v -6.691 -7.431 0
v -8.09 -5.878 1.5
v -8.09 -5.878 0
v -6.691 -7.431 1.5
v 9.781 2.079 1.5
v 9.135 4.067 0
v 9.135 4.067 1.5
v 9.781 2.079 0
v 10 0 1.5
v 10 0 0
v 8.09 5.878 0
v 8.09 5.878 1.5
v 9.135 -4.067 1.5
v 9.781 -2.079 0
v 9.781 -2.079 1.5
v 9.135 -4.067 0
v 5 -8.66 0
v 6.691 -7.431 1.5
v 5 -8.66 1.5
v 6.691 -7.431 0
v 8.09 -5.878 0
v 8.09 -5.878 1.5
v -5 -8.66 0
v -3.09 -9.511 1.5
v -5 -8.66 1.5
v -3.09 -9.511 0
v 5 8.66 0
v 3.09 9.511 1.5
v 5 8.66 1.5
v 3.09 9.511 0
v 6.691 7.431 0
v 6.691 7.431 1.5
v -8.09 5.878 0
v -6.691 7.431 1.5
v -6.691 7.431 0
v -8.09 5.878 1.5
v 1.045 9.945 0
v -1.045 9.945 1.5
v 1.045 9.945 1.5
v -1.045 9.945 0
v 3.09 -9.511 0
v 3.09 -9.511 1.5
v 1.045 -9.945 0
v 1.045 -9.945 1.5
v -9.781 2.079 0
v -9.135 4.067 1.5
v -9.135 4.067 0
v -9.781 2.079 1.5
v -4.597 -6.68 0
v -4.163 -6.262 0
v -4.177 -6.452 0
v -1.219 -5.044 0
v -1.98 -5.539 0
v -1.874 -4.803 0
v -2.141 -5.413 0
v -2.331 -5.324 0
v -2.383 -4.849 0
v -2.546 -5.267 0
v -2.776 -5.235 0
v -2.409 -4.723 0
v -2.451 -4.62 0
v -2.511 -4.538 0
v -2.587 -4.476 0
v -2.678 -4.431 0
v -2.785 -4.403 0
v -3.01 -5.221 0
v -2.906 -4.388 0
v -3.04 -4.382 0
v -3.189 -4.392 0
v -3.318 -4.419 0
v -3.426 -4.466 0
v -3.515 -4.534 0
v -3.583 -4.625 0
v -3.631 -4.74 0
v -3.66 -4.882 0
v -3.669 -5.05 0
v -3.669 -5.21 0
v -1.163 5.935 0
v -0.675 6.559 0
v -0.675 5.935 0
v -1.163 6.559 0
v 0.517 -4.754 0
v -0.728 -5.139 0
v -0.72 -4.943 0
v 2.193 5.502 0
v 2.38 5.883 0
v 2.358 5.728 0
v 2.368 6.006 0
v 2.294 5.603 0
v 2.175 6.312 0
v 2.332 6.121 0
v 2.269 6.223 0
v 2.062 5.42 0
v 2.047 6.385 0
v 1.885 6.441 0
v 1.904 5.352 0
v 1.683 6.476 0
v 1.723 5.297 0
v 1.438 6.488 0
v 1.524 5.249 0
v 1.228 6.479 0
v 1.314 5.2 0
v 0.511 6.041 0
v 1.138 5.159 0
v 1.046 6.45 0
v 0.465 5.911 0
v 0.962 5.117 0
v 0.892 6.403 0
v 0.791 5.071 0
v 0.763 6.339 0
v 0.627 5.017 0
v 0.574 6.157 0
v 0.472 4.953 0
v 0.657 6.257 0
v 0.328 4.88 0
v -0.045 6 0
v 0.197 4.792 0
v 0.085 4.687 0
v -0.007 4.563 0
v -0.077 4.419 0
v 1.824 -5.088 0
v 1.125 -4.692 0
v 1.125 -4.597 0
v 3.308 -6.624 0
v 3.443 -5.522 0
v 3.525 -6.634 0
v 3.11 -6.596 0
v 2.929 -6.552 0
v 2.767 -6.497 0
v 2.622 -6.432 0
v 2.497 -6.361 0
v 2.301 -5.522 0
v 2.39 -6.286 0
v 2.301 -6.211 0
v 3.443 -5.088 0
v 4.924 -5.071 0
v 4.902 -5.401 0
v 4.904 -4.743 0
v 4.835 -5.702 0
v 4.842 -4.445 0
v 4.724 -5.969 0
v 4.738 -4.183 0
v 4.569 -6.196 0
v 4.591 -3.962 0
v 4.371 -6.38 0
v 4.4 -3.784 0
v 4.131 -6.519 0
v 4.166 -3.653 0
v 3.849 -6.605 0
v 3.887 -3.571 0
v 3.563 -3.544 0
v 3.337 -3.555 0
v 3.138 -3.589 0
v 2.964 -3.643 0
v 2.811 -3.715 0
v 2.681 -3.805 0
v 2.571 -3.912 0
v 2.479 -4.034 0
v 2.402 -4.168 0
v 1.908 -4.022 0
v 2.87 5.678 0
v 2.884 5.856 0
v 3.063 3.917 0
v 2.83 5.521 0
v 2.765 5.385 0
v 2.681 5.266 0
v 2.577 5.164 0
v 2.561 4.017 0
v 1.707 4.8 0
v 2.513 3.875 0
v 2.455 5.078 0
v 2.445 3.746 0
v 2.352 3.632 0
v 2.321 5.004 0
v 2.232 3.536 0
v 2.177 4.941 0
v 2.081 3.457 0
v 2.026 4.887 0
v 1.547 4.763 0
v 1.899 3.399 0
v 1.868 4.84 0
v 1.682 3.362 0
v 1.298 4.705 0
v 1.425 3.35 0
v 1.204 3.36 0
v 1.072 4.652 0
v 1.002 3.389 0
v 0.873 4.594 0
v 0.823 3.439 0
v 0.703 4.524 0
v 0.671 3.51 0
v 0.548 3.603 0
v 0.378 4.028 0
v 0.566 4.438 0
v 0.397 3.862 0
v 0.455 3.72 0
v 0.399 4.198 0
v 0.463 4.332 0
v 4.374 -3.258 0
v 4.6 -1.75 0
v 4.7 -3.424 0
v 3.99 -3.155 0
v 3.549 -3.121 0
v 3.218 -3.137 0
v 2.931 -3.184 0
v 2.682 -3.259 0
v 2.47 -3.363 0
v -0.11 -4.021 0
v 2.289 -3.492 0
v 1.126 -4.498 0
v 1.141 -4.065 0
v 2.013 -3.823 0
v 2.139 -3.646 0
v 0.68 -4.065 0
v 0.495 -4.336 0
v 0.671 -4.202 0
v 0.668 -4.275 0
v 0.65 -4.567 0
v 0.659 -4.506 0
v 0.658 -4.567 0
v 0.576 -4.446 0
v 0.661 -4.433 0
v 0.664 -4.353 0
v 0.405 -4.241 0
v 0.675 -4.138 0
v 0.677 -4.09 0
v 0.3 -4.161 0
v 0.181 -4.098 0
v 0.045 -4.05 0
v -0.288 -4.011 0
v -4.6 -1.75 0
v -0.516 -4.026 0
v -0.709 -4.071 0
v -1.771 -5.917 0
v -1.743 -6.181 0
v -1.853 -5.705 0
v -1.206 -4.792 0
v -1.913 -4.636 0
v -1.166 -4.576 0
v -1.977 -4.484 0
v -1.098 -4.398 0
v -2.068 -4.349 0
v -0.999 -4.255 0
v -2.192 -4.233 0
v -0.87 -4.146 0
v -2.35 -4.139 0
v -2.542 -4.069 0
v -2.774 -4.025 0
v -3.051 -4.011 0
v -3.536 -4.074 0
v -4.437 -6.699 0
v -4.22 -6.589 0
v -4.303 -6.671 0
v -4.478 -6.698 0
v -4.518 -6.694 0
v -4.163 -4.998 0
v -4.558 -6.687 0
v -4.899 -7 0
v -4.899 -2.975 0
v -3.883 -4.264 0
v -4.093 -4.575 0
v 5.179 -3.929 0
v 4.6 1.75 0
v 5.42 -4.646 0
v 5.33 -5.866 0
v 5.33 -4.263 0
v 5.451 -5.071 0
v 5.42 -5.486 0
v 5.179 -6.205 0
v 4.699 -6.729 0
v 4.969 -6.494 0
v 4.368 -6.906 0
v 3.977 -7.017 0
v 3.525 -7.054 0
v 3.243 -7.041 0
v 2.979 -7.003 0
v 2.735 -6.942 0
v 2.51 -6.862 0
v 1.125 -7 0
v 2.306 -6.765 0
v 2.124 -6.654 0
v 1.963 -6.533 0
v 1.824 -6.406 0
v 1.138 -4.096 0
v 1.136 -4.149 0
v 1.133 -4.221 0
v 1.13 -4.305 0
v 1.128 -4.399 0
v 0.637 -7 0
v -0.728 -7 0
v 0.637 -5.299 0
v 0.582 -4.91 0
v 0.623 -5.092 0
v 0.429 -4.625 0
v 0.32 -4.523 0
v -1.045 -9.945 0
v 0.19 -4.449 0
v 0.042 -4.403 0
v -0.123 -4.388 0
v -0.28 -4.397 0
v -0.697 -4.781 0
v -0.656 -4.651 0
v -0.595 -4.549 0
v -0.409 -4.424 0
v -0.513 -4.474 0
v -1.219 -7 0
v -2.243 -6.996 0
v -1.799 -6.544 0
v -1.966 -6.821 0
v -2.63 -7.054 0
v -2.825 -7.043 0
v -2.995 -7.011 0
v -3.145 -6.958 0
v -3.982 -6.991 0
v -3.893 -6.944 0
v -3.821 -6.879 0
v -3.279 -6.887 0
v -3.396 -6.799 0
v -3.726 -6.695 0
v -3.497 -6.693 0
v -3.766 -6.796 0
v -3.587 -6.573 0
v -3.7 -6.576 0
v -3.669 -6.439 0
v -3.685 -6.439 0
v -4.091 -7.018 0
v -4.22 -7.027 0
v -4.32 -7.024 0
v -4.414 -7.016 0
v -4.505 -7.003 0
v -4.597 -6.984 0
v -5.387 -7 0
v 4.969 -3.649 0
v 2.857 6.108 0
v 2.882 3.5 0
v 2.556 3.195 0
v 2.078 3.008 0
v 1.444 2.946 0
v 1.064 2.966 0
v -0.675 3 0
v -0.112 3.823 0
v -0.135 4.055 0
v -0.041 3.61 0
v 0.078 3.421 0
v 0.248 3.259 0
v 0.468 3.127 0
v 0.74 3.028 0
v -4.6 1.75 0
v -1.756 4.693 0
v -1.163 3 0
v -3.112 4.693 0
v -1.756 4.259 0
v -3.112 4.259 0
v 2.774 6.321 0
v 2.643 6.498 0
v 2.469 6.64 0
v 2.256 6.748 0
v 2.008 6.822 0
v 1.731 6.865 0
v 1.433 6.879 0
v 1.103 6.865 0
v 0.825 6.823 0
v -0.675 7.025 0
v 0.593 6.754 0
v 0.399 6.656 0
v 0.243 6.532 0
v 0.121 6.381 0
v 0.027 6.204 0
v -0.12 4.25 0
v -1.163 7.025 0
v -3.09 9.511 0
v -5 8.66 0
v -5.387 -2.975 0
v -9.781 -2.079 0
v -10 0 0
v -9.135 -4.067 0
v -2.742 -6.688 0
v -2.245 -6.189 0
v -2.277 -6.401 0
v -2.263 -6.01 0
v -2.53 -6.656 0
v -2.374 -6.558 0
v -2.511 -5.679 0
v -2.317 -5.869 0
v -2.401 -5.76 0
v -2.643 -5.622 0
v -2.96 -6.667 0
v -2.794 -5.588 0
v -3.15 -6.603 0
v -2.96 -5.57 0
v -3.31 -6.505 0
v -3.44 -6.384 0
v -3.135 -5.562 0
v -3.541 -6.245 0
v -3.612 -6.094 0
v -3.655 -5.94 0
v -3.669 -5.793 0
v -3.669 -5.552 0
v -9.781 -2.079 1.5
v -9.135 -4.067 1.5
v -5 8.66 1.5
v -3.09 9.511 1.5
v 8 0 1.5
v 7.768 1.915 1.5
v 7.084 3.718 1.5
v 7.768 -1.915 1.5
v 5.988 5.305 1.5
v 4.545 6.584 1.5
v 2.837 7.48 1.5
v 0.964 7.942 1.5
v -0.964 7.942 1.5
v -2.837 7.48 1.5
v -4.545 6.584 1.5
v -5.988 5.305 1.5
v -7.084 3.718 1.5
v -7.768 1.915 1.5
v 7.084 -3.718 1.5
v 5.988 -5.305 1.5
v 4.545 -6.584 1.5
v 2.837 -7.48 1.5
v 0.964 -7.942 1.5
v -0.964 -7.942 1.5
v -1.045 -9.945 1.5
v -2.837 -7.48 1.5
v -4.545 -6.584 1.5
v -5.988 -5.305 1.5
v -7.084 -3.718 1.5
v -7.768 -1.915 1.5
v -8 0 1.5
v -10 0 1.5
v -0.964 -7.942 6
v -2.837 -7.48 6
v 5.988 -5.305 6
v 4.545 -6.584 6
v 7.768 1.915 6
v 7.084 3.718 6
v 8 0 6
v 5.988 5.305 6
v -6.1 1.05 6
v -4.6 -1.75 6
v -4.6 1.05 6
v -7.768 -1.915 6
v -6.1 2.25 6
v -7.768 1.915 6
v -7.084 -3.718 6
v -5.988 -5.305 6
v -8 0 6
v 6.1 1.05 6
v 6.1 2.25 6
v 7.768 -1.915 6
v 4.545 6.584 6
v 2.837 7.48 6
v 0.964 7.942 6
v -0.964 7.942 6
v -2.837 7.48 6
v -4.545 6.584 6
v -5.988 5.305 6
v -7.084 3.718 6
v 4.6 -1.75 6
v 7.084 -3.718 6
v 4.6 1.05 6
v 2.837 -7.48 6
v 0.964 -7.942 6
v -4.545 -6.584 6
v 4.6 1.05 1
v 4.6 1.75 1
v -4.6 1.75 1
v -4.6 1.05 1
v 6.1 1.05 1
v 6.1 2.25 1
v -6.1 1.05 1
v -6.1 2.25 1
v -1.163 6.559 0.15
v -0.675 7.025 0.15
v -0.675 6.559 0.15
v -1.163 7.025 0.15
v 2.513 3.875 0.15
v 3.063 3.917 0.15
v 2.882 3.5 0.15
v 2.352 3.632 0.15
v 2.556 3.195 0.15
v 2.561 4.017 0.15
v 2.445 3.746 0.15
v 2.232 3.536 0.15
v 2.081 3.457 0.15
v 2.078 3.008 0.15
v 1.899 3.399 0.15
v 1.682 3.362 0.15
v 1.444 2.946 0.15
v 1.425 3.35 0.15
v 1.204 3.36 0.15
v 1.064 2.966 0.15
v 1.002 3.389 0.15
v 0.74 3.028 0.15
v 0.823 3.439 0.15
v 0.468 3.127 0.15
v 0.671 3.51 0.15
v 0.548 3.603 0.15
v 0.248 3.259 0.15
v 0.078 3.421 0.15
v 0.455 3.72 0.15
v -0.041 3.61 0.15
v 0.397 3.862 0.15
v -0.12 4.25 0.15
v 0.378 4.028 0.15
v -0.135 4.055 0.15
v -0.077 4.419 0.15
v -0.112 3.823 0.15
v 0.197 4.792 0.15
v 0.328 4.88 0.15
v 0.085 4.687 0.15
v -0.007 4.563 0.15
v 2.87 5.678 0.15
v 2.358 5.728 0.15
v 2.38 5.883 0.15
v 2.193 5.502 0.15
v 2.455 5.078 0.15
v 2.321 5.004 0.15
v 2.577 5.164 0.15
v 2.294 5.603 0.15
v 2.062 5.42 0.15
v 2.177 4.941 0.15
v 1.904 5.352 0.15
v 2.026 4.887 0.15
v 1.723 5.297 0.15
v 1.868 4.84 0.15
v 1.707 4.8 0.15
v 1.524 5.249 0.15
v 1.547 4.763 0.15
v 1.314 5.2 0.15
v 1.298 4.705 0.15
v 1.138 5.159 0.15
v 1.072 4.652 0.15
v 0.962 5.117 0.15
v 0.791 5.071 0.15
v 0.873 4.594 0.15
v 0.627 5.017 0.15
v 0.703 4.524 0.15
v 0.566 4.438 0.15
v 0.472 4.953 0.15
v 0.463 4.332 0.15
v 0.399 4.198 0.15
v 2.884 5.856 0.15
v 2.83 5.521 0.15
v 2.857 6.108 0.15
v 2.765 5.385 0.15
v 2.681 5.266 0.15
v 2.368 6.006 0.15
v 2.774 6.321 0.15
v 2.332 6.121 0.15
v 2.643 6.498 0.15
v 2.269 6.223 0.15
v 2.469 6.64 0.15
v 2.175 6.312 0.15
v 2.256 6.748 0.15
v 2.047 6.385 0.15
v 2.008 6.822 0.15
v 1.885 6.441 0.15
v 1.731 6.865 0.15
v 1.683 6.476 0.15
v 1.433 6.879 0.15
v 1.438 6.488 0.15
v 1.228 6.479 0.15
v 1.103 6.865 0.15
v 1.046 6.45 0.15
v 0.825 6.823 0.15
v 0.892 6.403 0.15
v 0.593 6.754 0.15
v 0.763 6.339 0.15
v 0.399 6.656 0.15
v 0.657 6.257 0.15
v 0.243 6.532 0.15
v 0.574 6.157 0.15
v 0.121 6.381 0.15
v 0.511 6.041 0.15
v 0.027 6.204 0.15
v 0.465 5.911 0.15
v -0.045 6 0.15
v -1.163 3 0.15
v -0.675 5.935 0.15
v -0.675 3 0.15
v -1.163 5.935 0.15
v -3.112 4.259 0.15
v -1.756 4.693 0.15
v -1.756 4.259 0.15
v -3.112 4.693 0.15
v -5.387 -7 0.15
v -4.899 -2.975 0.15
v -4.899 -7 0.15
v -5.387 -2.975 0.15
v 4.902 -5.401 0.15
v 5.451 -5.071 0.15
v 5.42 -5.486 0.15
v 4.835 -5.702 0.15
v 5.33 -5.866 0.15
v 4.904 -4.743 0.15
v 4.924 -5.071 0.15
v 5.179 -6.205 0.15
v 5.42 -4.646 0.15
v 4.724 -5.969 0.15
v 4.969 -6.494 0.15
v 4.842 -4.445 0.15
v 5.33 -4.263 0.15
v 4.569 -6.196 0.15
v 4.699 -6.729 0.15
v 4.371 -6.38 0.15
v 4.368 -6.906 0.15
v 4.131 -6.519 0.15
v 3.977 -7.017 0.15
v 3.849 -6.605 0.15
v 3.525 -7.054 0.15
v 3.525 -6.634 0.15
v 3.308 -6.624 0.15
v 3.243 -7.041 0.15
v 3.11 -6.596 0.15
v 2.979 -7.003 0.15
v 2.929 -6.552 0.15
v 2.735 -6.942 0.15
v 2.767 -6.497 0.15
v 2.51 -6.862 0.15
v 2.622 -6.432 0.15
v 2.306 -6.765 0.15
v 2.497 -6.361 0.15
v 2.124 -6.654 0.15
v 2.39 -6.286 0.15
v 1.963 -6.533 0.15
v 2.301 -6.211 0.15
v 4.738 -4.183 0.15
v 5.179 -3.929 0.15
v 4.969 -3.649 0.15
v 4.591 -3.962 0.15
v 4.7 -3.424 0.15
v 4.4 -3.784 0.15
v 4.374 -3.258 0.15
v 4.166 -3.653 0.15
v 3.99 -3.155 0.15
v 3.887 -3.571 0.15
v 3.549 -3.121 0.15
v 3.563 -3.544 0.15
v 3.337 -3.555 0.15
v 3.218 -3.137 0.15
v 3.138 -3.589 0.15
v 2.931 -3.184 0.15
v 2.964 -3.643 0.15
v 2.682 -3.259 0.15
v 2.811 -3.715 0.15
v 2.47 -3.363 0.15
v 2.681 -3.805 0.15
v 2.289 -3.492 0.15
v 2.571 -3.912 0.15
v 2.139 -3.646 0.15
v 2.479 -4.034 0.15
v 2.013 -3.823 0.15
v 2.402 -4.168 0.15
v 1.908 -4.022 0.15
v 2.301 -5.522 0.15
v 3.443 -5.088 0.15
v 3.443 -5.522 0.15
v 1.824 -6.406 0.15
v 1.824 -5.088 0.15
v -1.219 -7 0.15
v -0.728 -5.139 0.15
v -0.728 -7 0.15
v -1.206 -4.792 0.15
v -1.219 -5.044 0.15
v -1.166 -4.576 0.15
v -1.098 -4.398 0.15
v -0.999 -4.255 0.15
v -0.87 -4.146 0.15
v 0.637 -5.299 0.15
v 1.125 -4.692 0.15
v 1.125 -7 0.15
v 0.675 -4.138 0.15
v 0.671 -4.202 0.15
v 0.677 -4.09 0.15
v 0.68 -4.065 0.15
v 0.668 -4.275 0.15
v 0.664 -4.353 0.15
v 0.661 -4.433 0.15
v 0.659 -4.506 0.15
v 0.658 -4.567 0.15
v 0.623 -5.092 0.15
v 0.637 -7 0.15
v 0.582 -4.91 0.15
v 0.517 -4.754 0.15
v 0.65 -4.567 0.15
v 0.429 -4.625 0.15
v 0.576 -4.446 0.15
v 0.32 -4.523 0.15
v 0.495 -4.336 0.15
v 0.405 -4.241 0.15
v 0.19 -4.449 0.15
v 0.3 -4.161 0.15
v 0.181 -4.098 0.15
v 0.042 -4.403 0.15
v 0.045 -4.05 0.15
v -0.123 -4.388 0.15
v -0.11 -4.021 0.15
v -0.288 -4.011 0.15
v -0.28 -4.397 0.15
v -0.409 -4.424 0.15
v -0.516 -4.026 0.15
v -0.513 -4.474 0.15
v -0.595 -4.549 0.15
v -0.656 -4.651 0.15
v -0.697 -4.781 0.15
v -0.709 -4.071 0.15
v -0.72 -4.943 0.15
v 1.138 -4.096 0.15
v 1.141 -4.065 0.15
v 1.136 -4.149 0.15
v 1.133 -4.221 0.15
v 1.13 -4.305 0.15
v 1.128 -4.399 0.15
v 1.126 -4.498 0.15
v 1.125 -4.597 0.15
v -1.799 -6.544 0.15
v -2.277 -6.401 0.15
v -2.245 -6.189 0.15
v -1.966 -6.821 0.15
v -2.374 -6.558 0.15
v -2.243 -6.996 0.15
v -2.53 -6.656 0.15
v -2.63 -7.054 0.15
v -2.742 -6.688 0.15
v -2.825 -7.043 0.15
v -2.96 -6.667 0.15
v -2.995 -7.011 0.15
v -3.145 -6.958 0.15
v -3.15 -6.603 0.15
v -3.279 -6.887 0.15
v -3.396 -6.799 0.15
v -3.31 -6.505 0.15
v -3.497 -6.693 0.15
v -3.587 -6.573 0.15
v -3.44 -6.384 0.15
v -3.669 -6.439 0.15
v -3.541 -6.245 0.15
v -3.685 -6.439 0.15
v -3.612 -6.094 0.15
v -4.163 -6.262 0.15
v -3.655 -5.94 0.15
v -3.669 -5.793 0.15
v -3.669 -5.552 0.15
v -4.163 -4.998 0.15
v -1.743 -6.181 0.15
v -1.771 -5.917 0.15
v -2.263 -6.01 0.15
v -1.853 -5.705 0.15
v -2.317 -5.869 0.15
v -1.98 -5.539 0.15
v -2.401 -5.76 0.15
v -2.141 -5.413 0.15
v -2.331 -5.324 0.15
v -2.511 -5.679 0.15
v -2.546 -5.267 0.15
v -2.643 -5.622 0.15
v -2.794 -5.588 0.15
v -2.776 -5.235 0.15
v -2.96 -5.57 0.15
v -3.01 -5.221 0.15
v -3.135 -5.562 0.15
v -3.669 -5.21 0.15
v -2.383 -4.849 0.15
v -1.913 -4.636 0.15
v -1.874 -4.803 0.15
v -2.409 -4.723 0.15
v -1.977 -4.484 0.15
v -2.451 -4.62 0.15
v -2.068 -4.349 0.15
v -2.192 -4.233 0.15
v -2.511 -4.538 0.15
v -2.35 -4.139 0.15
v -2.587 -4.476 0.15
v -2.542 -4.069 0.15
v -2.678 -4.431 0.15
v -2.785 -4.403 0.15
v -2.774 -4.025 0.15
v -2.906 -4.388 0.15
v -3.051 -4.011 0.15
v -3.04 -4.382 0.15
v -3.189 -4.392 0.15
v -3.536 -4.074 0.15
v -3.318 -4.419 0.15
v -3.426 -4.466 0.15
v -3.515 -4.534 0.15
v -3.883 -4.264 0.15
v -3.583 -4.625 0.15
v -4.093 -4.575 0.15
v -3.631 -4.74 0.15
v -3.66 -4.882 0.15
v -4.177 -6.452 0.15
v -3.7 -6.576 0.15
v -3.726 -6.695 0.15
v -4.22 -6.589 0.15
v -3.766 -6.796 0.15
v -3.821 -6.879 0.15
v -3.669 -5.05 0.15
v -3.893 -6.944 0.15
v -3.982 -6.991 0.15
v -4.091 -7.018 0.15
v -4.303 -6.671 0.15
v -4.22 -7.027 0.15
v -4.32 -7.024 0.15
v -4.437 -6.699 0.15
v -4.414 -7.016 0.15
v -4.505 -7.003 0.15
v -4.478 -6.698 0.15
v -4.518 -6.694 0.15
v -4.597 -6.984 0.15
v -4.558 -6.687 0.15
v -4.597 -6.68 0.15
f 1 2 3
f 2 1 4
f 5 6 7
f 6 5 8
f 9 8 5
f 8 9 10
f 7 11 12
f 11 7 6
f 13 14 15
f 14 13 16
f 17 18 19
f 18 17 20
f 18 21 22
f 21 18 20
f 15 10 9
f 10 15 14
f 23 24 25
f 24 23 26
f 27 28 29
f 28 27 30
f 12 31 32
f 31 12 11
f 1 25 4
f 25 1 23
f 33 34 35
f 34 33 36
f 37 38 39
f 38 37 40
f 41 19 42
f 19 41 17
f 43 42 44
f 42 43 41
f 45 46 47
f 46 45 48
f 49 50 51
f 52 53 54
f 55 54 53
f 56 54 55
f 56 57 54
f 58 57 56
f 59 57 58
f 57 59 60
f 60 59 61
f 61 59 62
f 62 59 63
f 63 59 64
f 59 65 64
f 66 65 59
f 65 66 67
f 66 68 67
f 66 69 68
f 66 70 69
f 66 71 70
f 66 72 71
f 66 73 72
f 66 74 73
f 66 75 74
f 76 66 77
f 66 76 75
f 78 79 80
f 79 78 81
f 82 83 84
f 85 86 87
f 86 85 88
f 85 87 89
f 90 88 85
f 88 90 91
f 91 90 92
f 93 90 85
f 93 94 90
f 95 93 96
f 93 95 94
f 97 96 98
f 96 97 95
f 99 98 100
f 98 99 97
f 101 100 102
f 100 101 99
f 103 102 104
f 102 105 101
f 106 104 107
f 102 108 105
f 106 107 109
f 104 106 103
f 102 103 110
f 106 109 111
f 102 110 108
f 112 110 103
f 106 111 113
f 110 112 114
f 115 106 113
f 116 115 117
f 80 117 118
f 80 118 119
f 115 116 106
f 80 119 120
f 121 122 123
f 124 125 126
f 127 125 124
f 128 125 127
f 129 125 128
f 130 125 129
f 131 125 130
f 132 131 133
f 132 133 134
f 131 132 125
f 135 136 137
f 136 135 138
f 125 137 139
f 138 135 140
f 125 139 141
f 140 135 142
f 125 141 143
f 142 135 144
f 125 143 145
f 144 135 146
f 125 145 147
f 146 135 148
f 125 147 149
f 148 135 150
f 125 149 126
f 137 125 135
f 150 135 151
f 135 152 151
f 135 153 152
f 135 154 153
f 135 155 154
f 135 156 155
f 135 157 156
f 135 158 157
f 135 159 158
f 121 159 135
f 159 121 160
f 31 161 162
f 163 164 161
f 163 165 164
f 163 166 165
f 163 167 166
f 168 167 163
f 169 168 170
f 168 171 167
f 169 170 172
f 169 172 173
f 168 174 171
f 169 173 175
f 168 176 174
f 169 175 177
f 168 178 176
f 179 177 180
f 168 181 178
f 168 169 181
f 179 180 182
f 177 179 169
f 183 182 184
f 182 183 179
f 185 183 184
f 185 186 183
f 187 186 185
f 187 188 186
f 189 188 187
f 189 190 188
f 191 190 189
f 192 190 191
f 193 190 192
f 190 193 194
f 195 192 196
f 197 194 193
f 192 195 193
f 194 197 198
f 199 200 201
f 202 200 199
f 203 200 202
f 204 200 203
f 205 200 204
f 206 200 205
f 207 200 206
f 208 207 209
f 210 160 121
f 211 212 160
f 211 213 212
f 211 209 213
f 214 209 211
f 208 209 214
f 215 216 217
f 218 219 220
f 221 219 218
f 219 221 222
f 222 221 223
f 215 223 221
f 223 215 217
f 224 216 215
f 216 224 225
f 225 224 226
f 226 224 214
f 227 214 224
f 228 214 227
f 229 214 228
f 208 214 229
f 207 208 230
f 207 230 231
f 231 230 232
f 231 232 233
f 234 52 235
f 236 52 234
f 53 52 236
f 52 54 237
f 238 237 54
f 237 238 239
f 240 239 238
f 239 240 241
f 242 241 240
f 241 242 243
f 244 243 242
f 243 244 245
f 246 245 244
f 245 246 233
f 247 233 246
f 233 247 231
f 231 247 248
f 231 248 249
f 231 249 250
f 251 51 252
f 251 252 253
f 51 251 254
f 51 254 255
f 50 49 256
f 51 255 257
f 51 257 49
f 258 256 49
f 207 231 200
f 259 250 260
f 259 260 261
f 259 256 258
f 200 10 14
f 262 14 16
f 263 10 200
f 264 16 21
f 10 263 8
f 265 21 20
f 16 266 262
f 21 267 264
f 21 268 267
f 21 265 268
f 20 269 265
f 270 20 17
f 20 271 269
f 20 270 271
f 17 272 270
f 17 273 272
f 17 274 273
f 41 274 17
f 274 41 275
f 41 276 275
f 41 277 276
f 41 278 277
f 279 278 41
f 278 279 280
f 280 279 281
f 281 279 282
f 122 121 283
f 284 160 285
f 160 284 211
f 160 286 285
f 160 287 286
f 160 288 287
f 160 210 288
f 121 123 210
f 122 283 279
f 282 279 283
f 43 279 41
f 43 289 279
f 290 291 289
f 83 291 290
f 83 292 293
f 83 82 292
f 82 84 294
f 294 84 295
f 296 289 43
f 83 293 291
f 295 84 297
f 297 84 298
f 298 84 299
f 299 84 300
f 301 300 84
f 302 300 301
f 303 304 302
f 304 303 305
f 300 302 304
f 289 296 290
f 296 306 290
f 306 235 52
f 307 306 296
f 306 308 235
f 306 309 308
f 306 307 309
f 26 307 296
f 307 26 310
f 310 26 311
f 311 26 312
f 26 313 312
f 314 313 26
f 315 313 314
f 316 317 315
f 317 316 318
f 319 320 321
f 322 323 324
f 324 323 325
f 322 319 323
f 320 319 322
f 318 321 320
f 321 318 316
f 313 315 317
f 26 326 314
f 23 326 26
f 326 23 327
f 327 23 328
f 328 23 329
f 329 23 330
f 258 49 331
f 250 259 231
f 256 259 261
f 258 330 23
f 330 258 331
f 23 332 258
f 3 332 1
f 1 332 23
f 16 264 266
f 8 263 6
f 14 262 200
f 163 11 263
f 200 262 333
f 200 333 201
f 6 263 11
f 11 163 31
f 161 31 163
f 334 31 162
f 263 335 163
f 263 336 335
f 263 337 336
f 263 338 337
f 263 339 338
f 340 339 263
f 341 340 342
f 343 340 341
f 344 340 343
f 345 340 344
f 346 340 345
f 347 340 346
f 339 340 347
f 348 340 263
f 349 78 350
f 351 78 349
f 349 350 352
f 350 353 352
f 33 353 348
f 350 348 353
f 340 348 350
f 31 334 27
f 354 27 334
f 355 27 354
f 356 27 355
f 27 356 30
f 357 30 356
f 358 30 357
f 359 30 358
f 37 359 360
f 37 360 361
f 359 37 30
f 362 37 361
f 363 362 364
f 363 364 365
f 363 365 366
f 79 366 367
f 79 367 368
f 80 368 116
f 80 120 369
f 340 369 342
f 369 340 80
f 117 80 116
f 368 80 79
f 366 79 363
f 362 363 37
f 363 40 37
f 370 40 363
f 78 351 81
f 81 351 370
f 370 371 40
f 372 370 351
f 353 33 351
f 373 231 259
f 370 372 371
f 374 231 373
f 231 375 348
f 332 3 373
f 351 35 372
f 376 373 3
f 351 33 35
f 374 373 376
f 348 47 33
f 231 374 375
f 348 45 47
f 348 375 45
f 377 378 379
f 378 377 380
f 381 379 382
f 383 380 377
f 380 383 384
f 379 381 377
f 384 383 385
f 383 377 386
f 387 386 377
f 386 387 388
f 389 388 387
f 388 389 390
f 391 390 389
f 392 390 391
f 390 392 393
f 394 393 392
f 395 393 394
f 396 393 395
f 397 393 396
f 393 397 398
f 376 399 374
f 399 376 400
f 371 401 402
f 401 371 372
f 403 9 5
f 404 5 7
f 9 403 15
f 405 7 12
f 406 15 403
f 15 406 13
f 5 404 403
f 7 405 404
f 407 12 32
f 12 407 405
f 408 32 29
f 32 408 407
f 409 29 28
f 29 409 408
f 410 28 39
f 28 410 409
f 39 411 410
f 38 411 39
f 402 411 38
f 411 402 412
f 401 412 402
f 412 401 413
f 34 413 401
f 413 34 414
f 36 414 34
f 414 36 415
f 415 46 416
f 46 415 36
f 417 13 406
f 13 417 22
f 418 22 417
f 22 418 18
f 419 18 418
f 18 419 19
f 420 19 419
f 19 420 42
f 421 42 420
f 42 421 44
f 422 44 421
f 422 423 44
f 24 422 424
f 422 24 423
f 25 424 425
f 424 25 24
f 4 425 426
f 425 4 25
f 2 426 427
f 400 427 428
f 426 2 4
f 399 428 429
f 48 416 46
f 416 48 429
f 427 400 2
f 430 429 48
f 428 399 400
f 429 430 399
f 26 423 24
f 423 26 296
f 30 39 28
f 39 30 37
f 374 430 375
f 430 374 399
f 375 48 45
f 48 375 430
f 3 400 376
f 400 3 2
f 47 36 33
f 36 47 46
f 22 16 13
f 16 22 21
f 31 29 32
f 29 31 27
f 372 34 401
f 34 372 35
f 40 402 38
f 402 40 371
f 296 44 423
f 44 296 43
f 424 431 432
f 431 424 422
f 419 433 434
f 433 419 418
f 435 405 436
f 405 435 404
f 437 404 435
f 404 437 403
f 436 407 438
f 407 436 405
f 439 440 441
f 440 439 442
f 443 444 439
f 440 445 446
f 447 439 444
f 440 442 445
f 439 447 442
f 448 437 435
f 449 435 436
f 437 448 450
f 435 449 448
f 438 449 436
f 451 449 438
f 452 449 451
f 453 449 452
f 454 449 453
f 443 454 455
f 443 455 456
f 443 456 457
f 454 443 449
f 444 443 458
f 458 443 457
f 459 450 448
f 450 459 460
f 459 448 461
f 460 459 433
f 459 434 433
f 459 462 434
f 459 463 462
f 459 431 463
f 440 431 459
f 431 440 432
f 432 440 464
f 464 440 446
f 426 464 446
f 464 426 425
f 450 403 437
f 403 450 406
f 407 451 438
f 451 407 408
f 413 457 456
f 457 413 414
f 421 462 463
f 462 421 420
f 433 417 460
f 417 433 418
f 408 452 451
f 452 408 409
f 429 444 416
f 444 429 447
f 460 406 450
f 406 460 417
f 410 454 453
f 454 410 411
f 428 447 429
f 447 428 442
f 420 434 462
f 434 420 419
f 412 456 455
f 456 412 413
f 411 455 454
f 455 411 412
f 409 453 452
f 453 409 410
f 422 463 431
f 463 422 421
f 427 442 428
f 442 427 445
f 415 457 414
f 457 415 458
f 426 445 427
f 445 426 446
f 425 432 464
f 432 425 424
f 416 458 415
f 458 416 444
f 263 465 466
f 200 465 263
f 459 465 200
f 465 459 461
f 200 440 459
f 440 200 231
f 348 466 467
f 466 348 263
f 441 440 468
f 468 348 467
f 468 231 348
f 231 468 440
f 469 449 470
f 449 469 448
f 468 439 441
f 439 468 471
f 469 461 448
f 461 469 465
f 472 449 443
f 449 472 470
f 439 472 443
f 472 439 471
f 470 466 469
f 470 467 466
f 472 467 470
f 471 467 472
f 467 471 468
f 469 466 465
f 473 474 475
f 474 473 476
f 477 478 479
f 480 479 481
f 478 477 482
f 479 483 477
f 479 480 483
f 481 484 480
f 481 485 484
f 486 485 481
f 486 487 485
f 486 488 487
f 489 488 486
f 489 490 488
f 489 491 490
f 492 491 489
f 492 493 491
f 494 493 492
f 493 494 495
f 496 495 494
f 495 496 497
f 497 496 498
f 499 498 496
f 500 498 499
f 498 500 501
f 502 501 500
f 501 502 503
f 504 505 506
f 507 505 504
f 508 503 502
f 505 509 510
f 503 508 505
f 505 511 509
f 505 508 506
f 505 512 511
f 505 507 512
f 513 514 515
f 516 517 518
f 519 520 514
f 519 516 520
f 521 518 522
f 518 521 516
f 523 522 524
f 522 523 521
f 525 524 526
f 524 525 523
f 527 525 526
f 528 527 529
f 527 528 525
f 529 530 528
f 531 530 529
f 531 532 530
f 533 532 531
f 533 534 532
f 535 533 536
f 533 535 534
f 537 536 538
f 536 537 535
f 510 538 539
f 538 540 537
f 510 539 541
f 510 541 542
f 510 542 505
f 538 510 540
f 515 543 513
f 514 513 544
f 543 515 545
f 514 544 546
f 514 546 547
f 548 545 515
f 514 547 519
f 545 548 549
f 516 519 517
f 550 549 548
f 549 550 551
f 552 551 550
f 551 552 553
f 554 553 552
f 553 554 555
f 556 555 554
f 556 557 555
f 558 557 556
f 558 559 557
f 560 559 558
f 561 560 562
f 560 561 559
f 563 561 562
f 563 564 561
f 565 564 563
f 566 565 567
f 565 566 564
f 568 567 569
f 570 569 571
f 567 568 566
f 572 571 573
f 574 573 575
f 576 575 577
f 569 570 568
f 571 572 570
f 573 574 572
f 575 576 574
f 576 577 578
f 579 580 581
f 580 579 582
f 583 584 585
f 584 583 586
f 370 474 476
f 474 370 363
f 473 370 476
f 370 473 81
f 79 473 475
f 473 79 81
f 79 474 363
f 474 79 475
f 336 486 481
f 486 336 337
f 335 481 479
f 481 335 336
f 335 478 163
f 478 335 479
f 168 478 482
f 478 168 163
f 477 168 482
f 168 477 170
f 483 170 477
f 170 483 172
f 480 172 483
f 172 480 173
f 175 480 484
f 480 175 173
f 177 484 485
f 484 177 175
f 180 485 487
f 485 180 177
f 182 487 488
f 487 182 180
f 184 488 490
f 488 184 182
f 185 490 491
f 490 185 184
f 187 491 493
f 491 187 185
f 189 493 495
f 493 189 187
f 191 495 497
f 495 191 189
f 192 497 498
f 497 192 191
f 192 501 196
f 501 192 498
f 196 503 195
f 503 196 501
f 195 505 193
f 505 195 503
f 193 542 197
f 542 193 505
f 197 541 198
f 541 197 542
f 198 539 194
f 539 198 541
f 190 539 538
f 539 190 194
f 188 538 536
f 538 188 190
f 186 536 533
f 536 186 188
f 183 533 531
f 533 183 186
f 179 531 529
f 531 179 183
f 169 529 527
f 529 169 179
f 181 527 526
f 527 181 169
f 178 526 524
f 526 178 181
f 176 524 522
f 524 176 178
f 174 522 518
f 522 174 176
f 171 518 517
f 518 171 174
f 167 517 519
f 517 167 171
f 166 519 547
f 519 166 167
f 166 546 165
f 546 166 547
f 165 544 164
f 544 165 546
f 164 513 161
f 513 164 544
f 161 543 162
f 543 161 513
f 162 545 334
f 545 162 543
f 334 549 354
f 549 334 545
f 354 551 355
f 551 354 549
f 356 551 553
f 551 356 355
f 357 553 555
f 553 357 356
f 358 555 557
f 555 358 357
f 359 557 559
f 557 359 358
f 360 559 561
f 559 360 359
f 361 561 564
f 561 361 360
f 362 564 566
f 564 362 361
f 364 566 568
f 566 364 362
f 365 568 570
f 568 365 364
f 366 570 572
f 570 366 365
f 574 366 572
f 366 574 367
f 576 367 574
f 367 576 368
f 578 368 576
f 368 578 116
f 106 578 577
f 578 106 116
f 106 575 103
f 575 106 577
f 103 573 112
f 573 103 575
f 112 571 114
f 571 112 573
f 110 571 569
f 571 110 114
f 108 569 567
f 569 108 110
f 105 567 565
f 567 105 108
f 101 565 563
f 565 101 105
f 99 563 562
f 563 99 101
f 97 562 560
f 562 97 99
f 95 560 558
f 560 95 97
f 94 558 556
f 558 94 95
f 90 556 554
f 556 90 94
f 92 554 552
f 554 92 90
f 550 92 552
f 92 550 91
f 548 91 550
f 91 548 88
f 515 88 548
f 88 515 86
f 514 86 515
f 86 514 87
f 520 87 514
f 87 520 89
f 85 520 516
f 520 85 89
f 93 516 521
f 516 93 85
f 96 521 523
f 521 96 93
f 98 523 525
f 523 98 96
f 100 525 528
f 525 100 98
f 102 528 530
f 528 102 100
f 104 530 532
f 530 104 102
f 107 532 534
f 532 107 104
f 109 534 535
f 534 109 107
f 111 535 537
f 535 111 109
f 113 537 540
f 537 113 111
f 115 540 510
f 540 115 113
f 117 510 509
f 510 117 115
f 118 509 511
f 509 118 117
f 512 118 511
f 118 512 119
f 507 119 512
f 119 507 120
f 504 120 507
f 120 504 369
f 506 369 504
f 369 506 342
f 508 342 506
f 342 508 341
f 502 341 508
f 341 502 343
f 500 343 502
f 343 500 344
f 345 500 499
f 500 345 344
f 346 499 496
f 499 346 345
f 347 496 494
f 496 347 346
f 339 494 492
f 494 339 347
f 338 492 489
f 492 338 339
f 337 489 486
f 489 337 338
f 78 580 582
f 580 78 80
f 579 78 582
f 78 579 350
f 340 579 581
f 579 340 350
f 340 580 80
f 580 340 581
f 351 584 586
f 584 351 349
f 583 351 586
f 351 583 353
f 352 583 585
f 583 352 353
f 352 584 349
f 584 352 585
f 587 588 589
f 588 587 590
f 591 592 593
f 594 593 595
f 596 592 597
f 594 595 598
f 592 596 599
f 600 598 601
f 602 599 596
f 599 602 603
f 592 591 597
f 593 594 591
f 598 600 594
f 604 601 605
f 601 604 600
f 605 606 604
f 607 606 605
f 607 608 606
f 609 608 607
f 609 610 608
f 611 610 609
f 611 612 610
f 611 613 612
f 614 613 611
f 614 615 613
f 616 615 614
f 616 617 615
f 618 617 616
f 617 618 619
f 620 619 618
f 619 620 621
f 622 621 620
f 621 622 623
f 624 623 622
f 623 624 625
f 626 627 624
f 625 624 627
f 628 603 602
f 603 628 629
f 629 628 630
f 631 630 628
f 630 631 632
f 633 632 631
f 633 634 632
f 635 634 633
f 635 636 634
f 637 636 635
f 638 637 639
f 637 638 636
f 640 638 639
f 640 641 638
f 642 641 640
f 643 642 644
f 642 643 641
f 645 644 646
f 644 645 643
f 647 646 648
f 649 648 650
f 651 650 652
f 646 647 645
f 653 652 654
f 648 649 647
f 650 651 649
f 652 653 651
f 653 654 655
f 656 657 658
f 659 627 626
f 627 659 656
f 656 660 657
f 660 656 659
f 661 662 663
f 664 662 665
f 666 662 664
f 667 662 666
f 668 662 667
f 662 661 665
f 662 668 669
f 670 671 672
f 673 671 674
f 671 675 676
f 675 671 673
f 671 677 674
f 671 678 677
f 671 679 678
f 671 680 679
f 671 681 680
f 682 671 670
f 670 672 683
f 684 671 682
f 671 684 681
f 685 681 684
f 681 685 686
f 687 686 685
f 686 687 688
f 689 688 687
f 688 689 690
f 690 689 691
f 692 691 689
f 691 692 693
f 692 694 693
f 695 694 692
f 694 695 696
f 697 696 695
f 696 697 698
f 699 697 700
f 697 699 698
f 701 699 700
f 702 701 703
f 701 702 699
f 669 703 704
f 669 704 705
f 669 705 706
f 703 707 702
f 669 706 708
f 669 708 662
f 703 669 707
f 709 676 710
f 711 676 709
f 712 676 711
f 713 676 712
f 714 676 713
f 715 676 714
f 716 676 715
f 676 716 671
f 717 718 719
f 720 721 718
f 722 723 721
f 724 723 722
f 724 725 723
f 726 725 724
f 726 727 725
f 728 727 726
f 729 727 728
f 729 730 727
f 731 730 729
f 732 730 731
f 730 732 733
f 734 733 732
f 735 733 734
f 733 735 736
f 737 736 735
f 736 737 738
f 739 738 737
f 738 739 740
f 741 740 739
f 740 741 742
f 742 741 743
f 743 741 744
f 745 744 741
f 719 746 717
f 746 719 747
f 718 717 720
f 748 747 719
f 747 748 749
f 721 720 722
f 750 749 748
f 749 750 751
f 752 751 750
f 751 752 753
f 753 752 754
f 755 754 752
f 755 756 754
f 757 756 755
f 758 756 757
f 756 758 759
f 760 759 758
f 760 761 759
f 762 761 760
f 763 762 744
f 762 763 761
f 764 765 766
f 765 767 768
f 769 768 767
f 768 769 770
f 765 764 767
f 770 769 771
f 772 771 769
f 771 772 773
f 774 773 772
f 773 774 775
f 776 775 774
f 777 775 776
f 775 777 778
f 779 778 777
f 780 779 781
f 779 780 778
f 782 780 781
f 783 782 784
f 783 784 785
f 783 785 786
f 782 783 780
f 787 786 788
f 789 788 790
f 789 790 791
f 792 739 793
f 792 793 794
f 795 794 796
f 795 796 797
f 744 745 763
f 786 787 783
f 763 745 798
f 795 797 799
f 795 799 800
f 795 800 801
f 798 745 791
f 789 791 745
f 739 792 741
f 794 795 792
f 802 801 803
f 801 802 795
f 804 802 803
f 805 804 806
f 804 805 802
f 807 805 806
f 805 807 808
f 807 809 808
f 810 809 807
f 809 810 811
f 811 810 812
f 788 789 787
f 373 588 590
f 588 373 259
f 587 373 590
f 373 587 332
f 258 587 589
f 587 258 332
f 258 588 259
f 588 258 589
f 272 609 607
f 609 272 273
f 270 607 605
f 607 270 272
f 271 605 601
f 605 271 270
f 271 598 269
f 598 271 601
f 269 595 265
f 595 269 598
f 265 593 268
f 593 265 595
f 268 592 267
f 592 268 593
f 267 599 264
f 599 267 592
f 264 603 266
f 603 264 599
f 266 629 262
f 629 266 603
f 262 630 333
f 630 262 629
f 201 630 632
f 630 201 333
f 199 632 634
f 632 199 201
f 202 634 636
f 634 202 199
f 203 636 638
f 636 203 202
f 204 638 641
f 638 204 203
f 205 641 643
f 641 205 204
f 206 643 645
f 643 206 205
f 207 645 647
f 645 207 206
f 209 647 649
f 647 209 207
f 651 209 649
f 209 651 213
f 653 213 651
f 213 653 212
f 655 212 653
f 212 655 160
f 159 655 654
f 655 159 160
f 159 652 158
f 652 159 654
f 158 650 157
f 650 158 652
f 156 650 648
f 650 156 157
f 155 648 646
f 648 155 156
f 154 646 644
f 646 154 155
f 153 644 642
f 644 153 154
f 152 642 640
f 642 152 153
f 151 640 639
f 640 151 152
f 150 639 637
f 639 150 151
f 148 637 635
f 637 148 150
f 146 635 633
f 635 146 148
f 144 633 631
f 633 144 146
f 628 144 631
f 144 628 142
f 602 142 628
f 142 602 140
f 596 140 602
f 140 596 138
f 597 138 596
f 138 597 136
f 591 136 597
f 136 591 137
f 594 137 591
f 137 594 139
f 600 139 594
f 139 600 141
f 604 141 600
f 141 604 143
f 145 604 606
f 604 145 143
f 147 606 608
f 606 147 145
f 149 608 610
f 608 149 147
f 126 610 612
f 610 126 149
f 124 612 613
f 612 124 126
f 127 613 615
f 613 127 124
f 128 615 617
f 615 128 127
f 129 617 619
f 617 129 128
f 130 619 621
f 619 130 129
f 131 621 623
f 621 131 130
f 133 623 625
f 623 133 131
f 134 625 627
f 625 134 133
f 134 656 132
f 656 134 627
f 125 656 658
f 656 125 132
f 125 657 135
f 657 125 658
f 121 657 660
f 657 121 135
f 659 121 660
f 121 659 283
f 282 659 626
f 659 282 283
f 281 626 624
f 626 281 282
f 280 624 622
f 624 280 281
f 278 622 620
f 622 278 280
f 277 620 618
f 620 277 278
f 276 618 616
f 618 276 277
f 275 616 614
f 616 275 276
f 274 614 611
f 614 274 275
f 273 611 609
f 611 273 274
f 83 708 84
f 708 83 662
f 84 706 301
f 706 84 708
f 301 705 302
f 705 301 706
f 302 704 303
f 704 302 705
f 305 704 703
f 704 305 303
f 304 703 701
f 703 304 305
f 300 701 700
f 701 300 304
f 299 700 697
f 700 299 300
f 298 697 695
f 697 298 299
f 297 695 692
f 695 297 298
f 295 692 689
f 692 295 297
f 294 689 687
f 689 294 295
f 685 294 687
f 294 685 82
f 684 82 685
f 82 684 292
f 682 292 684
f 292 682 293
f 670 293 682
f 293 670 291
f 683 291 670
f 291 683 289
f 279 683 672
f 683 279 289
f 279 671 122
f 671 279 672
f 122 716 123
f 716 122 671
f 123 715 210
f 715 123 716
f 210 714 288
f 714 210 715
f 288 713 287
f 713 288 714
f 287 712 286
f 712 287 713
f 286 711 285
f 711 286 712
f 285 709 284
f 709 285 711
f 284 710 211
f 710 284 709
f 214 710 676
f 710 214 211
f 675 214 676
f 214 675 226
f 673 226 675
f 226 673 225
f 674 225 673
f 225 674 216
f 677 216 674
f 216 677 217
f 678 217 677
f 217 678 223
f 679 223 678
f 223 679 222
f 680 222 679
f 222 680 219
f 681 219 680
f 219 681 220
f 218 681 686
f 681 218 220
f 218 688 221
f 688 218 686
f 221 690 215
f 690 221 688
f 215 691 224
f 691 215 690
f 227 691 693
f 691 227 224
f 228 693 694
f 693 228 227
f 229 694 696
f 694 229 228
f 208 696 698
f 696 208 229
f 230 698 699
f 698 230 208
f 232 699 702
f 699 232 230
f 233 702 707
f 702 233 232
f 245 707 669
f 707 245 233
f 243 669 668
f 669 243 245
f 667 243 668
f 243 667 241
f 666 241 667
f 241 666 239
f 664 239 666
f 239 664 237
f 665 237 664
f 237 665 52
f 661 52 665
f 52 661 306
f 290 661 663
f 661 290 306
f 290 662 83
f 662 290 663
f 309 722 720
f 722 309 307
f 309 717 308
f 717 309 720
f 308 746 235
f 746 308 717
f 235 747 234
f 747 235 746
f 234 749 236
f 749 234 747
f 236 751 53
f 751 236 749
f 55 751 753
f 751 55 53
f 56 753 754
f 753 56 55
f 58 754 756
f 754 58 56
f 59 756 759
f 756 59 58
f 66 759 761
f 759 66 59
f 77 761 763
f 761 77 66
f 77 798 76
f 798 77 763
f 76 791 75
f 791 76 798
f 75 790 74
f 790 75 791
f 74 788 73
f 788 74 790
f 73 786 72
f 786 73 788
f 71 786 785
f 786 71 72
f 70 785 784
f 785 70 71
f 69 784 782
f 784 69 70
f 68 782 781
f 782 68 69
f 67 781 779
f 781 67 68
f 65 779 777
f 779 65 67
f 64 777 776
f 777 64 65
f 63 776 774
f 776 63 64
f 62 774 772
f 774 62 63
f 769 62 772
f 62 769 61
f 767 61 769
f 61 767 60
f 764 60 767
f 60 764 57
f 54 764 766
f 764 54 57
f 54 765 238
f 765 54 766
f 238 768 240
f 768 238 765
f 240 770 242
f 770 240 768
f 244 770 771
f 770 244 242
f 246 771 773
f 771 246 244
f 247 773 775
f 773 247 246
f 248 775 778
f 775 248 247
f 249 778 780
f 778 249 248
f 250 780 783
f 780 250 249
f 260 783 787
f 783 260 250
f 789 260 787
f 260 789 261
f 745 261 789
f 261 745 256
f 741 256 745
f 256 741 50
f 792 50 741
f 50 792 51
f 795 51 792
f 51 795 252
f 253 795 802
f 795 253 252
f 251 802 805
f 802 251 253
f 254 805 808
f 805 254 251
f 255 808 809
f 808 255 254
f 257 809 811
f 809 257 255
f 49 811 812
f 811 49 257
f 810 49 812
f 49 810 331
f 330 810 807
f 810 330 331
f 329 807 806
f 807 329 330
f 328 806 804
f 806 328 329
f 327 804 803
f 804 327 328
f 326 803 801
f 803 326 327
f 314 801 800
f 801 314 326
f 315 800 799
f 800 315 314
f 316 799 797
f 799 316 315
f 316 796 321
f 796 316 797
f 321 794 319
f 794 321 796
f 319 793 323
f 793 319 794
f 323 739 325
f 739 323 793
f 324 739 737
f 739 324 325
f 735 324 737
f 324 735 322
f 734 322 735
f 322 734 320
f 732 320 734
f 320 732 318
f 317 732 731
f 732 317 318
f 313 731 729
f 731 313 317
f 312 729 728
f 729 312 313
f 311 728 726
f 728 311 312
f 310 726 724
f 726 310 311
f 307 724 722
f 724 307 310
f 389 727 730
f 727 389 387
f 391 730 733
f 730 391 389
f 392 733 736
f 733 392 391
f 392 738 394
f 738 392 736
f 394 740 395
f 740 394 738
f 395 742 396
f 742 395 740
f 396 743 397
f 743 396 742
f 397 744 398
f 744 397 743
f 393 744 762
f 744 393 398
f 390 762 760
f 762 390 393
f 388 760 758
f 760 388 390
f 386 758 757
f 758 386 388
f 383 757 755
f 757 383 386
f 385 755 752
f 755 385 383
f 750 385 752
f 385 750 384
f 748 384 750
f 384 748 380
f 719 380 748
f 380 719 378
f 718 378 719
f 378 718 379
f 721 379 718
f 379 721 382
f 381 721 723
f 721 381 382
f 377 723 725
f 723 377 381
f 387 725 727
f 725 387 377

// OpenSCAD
//usbc();
difference() {
    union(){
        cylinder(1.5, 10, 10);
        cylinder(6, 8, 8);
    }

translate([0,3,0])
    linear_extrude(0.3, center=true) mirror([1,0,0])
        text("Si-", size=4,halign="center");

translate([0,-7,0])
    linear_extrude(0.3, center=true) mirror([1,0,0])
        text("Gnal", size=4,halign="center");

    rotate([90,0,0]) usbc();
}

module usbc() {
    translate([0,10+1,0])
    union(){
        cube([9.2, 30, 3.5], center=true);
        translate([0,5,-3.3/2]) cube([12.2, 30, 1.2], center=true);
    }
    
}
